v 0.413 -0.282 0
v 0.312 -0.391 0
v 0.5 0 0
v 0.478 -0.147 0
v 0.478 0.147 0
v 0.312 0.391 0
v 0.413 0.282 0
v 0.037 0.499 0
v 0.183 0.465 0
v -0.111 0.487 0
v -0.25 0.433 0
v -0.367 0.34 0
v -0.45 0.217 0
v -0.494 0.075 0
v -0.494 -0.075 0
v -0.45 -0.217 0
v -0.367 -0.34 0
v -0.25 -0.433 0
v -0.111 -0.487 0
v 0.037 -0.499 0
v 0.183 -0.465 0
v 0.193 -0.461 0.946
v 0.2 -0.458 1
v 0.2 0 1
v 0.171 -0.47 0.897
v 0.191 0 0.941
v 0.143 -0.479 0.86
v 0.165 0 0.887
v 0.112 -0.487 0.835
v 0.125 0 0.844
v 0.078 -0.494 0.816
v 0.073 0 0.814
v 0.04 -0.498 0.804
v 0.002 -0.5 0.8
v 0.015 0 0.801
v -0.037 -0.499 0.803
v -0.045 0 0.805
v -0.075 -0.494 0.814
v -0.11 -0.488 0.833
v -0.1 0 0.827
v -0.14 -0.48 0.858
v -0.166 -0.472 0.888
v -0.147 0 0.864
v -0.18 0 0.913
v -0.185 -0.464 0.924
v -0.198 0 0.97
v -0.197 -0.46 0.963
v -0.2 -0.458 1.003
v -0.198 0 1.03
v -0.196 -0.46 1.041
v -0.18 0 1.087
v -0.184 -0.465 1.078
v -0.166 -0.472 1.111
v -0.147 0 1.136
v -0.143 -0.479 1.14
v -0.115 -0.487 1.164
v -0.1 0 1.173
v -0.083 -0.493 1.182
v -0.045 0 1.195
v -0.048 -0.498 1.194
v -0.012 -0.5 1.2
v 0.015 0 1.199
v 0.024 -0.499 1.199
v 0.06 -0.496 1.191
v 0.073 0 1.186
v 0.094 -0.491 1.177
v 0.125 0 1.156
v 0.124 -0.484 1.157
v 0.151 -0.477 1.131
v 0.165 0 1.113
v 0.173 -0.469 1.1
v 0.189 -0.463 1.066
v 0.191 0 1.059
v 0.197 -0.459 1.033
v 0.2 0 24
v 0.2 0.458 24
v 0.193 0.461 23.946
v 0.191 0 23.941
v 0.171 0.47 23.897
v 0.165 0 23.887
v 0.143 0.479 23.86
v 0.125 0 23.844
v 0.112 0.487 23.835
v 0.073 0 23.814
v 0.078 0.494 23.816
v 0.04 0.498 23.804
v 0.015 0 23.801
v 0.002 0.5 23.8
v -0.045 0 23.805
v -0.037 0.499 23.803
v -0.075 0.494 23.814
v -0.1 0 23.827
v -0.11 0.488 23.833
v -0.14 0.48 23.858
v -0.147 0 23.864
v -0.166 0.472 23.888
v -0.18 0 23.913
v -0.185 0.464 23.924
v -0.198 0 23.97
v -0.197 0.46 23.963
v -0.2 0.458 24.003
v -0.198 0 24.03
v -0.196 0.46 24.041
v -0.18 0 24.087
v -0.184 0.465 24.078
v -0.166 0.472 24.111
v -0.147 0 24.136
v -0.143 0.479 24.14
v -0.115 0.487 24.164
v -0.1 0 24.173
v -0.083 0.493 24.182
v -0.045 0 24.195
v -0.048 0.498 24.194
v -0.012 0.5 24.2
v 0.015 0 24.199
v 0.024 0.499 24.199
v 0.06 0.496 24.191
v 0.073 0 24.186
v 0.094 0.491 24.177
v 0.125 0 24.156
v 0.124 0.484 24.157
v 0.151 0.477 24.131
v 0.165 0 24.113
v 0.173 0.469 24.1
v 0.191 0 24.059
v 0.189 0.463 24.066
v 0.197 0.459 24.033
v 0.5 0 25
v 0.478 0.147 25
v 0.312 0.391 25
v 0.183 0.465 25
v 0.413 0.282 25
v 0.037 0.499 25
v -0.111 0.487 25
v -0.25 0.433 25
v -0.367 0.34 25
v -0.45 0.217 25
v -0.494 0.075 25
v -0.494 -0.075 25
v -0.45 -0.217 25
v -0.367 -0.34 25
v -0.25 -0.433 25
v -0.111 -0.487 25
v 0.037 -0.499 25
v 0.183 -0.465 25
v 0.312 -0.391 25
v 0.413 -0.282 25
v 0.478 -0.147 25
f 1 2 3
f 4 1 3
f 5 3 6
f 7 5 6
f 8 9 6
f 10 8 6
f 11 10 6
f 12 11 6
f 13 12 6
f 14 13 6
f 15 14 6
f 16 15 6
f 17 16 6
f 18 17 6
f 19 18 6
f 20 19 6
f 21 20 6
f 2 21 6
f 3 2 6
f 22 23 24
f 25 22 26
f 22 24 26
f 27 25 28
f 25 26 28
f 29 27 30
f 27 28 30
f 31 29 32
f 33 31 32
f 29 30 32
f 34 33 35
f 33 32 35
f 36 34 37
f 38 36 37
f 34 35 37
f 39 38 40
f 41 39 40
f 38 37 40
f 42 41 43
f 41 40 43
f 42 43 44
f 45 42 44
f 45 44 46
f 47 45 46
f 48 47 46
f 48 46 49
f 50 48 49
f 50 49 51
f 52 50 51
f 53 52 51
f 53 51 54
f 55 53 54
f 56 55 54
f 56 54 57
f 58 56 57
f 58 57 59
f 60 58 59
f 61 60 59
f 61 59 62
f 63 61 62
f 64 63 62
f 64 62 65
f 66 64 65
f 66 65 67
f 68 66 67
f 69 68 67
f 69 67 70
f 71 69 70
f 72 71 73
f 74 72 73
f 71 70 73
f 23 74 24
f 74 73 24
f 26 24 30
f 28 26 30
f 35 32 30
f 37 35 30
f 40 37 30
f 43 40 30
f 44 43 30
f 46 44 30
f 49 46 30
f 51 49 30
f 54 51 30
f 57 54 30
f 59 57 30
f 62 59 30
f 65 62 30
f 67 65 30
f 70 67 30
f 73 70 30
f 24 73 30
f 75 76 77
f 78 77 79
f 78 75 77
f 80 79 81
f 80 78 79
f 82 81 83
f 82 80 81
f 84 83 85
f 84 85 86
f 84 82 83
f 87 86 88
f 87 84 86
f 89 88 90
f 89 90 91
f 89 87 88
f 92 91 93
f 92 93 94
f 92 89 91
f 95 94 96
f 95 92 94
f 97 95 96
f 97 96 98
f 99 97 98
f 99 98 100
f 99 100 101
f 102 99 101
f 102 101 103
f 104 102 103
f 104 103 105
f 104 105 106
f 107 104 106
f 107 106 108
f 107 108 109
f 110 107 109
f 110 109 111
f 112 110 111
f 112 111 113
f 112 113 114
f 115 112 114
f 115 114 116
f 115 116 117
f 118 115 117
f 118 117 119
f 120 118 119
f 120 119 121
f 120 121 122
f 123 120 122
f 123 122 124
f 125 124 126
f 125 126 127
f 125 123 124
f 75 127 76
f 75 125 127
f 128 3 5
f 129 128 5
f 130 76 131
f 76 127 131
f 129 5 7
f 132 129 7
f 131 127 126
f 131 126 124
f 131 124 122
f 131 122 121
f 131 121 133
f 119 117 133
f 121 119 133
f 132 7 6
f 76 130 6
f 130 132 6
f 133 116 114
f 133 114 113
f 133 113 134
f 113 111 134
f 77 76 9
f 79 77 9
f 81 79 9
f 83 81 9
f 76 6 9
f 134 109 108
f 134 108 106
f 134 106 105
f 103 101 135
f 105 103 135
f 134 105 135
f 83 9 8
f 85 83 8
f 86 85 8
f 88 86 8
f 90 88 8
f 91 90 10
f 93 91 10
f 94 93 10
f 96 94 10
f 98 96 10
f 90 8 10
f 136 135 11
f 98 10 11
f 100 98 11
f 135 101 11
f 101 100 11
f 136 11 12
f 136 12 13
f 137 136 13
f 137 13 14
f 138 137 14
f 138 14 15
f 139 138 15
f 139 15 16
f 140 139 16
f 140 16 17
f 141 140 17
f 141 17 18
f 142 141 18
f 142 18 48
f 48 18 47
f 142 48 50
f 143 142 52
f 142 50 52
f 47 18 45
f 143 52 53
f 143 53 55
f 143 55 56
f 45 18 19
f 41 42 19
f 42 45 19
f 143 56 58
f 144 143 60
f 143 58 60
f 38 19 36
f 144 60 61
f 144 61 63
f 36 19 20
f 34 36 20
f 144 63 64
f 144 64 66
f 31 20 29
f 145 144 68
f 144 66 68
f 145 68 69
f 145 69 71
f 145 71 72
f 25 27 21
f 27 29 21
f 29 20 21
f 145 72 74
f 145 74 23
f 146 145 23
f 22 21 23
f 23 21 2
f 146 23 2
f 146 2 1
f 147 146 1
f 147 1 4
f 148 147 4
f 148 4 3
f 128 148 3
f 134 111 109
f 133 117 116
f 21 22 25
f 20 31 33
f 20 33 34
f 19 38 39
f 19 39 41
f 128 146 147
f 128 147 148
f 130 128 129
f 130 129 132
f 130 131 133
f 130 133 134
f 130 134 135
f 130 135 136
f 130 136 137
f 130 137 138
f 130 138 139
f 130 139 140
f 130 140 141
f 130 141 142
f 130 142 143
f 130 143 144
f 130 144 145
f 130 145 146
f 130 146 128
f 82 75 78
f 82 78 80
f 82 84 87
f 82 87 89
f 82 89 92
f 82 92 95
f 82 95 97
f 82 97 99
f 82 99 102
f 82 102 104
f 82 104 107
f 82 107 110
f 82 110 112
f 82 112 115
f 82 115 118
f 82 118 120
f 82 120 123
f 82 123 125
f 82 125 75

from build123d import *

# Parameters (mm, degrees)
ESQUISSE1_R             = 0.5
BOSS_EXTRU_1_DEPTH      = 25
ESQUISSE3_R             = 0.2
ENL_V_MAT_EXTRU_3_DEPTH = 1
ESQUISSE4_R             = 0.2
ENL_V_MAT_EXTRU_4_DEPTH = 1


with BuildPart() as part:
    # Esquisse1 → Boss.-Extru.1 (new body)
    with BuildSketch(Plane.XY):
        Circle(ESQUISSE1_R)
    extrude(amount=BOSS_EXTRU_1_DEPTH)

    # Esquisse3 → Enlèv. mat.-Extru.3 (cut)
    with BuildSketch(Plane(origin=(0, 0, 0), x_dir=(1, 0, 0), z_dir=(0, 1, 0))):
        with Locations((0, -1)):
            Circle(ESQUISSE3_R)
    extrude(amount=-ENL_V_MAT_EXTRU_3_DEPTH, mode=Mode.SUBTRACT)

    # Esquisse4 → Enlèv. mat.-Extru.4 (cut)
    with BuildSketch(Plane(origin=(0, 0, 0), x_dir=(1, 0, 0), z_dir=(0, 1, 0))):
        with Locations((0, -24)):
            Circle(ESQUISSE4_R)
    extrude(amount=ENL_V_MAT_EXTRU_4_DEPTH, mode=Mode.SUBTRACT)


solid = part.part
